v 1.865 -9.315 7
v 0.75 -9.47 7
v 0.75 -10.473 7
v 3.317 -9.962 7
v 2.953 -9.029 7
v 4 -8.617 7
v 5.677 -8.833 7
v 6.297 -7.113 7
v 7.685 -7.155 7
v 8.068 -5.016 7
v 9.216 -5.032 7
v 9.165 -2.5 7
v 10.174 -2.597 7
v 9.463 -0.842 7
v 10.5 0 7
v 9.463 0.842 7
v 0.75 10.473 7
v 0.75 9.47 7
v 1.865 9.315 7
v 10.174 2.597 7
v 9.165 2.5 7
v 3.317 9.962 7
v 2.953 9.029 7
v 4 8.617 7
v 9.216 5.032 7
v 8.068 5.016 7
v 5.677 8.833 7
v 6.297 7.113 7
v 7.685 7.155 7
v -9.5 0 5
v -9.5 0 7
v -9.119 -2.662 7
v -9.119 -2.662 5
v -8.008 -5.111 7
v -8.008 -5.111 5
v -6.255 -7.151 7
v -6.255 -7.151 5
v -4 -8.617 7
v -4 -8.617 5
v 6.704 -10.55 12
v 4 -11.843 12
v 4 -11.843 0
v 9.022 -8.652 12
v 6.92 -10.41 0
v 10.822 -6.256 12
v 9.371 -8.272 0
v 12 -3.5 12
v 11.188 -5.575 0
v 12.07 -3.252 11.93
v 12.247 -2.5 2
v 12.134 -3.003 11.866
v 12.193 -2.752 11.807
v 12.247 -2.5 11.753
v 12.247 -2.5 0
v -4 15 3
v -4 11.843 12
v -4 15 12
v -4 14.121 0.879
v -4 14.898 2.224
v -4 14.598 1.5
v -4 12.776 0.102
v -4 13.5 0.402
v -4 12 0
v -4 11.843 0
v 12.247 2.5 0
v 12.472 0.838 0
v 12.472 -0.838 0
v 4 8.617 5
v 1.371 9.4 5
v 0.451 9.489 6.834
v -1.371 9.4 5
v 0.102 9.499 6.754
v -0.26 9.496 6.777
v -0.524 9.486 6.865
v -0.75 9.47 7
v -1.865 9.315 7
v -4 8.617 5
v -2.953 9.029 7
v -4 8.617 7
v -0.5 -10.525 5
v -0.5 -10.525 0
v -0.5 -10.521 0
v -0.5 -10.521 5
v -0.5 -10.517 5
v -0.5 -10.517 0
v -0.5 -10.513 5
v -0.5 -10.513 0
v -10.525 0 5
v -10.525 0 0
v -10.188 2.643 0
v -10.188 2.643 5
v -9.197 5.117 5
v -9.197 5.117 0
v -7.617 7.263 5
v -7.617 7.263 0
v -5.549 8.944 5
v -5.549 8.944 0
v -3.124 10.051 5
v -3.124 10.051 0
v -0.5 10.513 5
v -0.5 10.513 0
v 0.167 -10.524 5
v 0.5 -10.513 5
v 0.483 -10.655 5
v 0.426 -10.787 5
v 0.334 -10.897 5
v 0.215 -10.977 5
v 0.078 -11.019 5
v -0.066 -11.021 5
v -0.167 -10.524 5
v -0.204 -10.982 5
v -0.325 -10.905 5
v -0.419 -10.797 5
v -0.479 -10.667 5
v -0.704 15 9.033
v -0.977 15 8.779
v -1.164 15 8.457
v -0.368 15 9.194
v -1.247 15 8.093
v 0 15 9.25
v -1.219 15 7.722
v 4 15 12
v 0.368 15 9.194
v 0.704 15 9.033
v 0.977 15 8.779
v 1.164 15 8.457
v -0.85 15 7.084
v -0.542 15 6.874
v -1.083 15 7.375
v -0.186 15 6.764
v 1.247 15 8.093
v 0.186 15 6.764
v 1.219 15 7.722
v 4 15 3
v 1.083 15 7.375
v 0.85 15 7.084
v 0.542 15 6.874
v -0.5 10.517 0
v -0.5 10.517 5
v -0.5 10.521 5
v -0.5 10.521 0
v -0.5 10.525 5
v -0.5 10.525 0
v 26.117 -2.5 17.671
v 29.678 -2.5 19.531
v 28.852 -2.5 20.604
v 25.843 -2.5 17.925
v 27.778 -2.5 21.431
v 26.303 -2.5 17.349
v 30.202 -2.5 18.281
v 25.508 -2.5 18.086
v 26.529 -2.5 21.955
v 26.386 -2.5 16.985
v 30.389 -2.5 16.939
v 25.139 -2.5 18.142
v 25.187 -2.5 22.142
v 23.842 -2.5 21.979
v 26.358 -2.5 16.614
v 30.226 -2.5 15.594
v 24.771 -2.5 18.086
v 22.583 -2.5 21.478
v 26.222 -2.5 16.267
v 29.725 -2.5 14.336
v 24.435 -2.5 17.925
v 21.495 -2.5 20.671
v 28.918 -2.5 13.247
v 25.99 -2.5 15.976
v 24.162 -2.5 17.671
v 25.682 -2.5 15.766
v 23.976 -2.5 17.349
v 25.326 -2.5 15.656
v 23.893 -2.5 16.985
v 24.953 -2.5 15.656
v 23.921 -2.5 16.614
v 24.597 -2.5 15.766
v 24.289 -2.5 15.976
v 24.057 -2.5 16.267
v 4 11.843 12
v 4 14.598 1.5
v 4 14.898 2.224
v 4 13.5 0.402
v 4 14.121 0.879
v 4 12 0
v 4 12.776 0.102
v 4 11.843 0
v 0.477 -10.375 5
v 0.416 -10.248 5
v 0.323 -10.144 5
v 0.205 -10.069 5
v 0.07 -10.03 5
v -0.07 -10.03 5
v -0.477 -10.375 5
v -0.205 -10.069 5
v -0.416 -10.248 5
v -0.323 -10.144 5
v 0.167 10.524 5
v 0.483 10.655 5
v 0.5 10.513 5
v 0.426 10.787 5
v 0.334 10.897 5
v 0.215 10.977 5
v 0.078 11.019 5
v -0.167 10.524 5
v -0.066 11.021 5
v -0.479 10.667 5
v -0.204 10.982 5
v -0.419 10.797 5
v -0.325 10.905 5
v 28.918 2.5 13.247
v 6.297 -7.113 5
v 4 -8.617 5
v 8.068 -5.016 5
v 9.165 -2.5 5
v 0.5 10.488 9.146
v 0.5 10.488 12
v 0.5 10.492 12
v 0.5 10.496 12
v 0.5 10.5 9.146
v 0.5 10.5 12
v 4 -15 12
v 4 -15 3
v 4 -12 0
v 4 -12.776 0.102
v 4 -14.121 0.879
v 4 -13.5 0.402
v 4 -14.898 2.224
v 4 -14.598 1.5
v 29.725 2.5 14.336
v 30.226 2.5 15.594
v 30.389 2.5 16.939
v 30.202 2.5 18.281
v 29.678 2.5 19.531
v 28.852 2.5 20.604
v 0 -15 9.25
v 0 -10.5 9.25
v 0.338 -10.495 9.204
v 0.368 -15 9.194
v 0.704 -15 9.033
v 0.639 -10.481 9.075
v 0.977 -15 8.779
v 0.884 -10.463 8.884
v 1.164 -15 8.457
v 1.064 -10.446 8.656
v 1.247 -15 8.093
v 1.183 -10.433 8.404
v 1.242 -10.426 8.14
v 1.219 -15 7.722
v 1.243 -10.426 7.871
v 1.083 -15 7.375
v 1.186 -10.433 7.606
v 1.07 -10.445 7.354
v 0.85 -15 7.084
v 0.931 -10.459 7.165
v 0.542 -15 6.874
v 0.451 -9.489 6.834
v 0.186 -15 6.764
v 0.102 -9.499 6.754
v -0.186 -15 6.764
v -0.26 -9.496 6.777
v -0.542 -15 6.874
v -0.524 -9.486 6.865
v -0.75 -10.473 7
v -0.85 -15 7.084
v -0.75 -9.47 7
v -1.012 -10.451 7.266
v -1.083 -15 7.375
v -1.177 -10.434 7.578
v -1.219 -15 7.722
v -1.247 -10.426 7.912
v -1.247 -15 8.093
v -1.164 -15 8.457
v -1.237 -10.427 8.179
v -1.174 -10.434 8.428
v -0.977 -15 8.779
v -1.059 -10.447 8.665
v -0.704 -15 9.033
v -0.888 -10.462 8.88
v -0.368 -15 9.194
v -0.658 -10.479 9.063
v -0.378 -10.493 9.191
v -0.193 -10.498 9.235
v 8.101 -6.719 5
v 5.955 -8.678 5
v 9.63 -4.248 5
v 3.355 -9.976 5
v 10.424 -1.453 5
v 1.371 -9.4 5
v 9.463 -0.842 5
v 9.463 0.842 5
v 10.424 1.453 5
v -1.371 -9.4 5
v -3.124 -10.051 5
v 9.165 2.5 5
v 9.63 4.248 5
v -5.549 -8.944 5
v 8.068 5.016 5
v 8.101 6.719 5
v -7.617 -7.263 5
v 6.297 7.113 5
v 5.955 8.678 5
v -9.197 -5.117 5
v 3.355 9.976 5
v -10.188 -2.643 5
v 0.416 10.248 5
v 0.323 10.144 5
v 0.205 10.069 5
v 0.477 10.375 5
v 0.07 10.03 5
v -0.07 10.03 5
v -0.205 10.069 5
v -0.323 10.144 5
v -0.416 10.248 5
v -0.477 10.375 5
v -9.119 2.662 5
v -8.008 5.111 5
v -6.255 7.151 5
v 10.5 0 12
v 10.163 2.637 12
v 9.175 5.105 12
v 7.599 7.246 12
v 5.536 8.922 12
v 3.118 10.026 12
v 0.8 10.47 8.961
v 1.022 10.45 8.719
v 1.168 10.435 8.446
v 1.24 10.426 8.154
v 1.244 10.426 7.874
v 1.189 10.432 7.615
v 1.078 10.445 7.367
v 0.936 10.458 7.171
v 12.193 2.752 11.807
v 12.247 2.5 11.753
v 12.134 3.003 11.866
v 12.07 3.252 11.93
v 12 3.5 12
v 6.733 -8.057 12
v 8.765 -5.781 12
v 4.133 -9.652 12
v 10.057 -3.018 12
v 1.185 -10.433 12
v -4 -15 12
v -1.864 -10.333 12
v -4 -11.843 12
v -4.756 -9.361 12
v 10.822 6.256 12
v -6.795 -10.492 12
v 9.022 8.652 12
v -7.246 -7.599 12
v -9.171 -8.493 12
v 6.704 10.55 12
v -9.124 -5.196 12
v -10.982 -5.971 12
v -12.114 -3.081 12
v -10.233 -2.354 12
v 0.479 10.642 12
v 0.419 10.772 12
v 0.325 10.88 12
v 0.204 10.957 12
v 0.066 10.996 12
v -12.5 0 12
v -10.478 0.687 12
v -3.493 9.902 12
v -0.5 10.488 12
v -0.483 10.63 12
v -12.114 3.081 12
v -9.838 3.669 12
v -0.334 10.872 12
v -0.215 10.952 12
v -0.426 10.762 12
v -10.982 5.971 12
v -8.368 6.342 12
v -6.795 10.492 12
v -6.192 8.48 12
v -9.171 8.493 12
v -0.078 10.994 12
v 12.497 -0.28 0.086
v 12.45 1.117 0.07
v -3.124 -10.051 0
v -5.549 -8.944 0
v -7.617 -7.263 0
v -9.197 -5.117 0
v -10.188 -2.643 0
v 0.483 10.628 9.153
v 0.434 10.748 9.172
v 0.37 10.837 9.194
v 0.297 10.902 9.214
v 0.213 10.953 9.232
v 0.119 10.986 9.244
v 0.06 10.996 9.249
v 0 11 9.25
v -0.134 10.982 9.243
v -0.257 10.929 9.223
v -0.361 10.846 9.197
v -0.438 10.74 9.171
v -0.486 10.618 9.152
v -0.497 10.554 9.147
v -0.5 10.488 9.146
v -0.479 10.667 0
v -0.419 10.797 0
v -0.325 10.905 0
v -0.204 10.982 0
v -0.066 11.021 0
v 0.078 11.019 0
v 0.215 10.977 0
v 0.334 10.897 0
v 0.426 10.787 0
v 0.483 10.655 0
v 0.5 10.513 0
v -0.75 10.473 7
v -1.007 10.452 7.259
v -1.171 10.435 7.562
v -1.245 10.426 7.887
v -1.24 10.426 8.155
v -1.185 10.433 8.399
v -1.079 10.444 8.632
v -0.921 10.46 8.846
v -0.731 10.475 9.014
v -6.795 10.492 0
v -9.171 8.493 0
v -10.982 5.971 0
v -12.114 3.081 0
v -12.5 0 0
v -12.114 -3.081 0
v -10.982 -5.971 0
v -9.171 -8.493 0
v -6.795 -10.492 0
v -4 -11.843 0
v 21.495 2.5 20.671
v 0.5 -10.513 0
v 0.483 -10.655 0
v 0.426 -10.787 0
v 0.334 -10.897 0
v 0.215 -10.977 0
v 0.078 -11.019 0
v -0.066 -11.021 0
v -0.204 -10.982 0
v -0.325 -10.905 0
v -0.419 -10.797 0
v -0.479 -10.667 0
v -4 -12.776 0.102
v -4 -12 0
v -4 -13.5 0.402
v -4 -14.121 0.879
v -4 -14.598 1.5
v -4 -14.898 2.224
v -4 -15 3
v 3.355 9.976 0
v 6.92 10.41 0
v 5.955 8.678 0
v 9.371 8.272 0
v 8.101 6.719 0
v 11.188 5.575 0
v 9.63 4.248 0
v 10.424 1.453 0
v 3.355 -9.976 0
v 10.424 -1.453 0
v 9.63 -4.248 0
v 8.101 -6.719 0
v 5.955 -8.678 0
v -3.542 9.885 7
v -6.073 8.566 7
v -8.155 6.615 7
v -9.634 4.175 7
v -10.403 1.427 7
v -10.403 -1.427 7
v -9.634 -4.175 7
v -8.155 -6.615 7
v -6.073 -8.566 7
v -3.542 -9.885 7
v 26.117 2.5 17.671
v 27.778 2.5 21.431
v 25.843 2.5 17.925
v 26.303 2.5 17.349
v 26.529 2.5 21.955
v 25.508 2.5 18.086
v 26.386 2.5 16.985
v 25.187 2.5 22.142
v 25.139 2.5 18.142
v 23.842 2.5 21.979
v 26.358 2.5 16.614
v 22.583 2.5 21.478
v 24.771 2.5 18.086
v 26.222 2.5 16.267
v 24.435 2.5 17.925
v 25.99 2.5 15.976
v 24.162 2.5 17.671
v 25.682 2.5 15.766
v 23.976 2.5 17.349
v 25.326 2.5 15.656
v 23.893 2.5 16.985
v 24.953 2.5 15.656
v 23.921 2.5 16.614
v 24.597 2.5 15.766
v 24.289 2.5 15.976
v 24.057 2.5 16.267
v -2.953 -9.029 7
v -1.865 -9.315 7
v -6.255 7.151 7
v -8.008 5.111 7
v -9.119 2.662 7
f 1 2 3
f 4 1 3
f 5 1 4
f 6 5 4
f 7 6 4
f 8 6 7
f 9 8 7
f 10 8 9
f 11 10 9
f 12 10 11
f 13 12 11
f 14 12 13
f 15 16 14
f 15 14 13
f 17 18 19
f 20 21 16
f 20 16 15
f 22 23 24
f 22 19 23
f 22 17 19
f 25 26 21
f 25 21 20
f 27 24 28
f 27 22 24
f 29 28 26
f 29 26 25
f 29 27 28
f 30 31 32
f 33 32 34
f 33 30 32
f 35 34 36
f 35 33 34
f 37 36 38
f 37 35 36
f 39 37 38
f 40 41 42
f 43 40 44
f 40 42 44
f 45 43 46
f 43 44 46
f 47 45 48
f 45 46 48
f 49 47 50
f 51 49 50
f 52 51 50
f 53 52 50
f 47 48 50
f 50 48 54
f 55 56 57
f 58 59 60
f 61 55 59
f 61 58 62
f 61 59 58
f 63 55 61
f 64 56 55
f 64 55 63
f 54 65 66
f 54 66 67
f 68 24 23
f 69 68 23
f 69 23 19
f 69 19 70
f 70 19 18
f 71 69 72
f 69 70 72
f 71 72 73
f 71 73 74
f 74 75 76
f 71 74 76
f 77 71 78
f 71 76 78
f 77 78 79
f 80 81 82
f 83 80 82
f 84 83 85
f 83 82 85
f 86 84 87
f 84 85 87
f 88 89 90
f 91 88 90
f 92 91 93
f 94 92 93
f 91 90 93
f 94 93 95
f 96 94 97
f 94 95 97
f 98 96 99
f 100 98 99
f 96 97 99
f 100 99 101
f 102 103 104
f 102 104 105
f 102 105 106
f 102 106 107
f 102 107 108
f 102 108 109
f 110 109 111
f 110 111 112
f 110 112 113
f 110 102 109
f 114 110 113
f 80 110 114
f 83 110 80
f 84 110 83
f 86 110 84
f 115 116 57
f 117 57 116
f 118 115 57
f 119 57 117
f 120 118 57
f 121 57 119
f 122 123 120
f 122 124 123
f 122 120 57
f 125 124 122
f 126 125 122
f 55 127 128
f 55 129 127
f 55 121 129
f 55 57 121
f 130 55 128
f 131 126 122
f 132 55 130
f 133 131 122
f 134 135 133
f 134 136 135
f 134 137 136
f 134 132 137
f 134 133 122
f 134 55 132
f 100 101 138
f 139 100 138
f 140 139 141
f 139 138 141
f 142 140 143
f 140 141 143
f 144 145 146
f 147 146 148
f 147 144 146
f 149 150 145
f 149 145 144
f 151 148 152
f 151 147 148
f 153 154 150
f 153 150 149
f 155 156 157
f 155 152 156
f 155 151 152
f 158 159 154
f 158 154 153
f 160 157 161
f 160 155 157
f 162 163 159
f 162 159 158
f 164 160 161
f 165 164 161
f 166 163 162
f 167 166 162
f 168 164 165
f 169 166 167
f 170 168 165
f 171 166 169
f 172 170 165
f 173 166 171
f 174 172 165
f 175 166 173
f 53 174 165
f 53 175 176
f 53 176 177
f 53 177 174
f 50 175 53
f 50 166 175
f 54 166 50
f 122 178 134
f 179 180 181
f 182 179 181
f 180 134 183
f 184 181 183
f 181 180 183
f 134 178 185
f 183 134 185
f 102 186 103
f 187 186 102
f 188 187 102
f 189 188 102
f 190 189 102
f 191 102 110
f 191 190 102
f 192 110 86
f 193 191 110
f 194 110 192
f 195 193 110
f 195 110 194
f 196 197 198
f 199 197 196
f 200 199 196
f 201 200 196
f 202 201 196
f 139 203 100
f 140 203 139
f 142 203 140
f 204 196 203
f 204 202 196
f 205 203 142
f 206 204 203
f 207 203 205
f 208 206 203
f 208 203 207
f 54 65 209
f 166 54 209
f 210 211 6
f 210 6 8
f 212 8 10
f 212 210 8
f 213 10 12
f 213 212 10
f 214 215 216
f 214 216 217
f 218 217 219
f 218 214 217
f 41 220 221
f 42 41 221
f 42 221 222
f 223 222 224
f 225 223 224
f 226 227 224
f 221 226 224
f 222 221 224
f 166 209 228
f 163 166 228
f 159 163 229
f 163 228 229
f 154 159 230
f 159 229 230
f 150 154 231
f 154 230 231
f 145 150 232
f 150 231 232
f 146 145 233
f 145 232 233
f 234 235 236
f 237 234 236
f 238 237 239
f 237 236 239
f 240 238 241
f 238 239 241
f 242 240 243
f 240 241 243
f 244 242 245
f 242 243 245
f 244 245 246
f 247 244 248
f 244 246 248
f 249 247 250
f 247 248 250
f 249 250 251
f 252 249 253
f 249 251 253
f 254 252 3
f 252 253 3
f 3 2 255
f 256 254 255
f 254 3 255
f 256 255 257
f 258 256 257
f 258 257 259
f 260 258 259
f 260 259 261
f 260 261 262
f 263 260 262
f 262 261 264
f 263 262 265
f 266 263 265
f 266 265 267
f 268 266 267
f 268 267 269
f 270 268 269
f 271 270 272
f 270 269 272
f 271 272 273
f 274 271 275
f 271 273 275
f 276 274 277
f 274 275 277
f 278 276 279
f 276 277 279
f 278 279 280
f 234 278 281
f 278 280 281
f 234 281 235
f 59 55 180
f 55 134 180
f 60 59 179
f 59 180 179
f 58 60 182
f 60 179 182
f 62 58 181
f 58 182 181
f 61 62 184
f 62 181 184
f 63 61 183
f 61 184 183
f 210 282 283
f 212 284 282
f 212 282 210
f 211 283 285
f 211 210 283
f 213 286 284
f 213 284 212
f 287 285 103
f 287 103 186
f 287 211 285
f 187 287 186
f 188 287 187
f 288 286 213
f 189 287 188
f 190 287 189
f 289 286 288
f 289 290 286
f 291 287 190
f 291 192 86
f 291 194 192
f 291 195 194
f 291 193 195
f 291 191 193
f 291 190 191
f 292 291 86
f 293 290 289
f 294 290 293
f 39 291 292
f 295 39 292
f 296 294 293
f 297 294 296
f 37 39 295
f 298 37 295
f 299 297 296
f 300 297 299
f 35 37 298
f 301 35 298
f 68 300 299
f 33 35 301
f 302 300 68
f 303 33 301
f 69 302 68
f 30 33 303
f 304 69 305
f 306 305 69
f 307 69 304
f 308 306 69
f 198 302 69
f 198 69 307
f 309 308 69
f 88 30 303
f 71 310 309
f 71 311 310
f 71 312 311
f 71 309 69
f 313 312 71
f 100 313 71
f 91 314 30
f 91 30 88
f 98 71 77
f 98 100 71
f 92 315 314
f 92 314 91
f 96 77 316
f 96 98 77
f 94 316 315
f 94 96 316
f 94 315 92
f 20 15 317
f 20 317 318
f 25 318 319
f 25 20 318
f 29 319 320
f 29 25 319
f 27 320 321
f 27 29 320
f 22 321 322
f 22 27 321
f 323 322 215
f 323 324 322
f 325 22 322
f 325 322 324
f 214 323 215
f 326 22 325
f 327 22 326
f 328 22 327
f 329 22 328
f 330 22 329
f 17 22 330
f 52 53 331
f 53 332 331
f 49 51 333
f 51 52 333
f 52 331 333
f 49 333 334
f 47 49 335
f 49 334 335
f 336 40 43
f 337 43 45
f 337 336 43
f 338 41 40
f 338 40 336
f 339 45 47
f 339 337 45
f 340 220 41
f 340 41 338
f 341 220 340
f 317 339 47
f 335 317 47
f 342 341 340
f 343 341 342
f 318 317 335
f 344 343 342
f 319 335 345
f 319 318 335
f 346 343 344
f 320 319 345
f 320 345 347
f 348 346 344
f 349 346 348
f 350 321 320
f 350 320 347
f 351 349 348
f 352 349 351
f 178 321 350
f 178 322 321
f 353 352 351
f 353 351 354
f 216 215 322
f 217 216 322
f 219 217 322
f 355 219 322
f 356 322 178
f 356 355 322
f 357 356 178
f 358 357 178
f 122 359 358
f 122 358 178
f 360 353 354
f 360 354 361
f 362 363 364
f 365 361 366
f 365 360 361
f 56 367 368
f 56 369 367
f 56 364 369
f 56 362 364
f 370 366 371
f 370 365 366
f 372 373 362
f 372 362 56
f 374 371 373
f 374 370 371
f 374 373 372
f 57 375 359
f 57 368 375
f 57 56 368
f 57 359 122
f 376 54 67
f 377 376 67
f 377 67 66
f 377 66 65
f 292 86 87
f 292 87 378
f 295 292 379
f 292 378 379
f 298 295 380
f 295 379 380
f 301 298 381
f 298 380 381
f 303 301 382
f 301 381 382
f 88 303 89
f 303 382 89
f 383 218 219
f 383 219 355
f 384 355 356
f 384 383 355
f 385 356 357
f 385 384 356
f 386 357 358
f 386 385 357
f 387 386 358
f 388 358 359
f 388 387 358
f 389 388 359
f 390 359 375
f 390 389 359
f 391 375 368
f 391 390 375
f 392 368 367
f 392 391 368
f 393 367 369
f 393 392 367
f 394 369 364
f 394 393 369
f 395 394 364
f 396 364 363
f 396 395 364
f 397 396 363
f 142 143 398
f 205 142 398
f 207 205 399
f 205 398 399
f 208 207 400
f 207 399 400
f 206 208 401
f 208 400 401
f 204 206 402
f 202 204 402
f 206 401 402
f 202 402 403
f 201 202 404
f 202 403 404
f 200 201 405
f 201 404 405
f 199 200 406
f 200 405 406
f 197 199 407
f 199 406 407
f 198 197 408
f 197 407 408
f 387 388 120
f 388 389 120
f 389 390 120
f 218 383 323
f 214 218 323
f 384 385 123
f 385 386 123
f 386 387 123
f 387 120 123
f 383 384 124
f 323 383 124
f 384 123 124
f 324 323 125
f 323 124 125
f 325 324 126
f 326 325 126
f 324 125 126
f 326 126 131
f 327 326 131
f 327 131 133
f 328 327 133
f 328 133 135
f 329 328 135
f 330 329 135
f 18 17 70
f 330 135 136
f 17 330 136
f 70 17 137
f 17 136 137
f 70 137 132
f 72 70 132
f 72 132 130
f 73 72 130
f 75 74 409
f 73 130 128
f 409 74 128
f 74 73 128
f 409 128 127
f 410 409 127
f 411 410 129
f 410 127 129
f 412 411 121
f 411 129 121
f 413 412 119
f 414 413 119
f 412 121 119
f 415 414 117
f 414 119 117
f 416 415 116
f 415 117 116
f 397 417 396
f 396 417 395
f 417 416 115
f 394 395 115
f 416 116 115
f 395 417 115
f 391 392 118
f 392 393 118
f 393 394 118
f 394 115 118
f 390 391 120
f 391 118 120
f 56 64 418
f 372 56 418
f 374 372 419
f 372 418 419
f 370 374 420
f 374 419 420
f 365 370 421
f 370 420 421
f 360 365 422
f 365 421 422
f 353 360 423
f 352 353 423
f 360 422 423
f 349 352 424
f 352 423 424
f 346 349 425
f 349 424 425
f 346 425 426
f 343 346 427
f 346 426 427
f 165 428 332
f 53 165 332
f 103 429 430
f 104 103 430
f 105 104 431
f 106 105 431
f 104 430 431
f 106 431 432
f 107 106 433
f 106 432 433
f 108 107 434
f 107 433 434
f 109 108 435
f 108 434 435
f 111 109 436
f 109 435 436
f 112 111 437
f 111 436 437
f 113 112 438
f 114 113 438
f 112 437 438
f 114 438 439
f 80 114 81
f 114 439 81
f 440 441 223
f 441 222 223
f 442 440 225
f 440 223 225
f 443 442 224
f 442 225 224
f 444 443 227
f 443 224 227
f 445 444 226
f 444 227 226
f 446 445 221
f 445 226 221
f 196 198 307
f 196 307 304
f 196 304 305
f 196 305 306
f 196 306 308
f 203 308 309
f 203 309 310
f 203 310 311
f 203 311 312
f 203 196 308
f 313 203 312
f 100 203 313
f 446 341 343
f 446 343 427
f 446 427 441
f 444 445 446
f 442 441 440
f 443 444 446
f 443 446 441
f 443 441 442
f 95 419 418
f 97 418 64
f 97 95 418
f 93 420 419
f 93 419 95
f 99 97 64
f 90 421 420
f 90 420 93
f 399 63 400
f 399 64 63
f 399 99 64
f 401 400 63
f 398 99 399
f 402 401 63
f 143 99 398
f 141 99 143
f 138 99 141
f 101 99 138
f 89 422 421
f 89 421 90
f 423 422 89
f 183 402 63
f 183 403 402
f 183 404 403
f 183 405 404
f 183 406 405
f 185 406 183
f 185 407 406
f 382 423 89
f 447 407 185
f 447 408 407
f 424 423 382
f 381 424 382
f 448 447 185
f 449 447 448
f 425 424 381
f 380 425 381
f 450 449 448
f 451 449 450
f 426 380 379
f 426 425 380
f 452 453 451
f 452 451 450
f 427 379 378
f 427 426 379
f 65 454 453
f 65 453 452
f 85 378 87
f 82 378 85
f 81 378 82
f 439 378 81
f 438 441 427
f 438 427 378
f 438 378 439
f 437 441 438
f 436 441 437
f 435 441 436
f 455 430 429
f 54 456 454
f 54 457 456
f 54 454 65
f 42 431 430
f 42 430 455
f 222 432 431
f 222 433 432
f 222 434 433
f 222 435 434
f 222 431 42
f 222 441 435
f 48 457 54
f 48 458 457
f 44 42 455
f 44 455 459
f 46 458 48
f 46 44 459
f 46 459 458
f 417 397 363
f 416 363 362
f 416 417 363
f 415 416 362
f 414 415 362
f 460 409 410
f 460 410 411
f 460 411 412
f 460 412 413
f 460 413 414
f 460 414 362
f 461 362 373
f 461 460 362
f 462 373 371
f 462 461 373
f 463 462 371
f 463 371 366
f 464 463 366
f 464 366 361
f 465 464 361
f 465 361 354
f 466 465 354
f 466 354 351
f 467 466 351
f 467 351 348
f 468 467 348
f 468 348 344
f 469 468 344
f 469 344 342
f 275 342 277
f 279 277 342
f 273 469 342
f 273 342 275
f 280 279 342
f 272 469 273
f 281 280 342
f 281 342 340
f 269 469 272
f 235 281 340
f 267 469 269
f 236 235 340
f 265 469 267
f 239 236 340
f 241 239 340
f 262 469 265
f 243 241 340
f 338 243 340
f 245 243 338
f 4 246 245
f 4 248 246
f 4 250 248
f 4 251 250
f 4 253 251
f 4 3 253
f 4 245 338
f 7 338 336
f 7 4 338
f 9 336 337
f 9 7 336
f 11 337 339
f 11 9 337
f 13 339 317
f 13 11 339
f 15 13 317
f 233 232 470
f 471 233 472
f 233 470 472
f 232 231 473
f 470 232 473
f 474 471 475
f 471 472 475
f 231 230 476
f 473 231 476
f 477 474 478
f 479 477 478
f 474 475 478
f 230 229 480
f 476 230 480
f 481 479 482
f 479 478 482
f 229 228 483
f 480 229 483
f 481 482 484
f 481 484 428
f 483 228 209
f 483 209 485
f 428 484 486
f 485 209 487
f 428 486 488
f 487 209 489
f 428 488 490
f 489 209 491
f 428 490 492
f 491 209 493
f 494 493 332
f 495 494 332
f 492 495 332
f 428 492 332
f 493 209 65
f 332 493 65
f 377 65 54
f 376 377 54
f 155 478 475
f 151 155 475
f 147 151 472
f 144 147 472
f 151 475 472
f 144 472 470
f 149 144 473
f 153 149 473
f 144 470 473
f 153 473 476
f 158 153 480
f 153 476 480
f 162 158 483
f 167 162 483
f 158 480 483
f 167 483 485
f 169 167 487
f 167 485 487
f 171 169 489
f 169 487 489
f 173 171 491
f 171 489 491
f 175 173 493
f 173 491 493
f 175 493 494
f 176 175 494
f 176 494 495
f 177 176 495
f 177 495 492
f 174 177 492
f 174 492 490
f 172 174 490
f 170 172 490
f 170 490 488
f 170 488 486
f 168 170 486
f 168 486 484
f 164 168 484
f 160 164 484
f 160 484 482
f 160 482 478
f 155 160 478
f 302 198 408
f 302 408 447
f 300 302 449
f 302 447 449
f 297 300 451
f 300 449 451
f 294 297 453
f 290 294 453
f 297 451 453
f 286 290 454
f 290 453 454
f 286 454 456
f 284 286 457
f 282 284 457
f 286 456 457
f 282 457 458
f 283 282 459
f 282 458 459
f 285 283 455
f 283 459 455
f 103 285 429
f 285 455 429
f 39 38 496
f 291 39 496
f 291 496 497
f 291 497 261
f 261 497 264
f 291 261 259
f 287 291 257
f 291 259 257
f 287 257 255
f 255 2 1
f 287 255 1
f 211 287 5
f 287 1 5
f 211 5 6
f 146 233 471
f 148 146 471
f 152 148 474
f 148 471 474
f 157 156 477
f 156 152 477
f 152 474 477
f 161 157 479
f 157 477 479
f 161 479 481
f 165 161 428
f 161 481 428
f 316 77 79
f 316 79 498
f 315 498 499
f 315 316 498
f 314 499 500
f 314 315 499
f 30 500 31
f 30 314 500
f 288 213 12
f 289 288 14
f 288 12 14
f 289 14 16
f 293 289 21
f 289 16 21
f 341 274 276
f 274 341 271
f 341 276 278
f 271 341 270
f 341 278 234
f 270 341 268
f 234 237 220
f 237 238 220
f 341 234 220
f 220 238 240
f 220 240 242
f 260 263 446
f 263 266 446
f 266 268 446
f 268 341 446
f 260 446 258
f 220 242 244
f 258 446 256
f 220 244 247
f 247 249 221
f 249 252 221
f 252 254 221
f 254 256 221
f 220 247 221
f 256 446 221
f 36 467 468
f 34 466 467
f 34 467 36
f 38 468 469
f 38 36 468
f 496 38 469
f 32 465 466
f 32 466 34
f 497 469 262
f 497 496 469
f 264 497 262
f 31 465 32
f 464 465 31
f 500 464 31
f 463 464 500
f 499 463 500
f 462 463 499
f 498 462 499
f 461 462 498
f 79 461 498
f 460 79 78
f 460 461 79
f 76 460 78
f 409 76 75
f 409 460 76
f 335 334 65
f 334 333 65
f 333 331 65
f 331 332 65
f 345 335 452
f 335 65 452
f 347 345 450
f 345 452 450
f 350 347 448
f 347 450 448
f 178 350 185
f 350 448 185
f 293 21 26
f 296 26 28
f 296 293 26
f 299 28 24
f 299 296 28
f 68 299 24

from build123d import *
from build123d.topology import SkipClean

# Parameters (mm, degrees)
SKETCH1_R                = 12.5
SKETCH1_R_2              = 9.5
BOSS_EXTRUDE1_DEPTH      = 7
SKETCH2_R                = 12.5
SKETCH2_R_2              = 9.5
BOSS_EXTRUDE2_DEPTH      = 5
BOSS_EXTRUDE3_DEPTH      = 15
BOSS_EXTRUDE3_DEPTH_BACK = 15
SKETCH3_W                = 8
SKETCH3_H                = 12
FILLET1_R                = 3
SKETCH6_R                = 1.25
CUT_EXTRUDE3_DEPTH       = 35.644624403
SKETCH7_W                = 10
SKETCH7_H                = 5
BOSS_EXTRUDE4_DEPTH      = 16
CHAMFER1_SIZE            = 8
SKETCH8_W                = 10.963763172
SKETCH8_H                = 5
BOSS_EXTRUDE5_DEPTH      = 18
SKETCH9_R                = 1.25
CUT_EXTRUDE4_DEPTH       = 45.459649771
BOSS_EXTRUDE7_DEPTH      = 5
SKETCH12_R               = 10.525
CUT_EXTRUDE7_DEPTH       = 5
SKETCH4_R                = 9.5
CUT_EXTRUDE8_DEPTH       = 36.951519181
SKETCH14_R               = 0.5
CUT_EXTRUDE9_DEPTH       = 5
CUT_EXTRUDE10_DEPTH      = 5
CUT_EXTRUDE12_DEPTH      = 5


with BuildPart() as part:
    # Sketch1 → Boss-Extrude1 (new body)
    with BuildSketch(Plane.XY):
        Circle(SKETCH1_R)
        Circle(SKETCH1_R_2, mode=Mode.SUBTRACT)
    extrude(amount=BOSS_EXTRUDE1_DEPTH)

    # Sketch2 → Boss-Extrude2 (add)
    with BuildSketch(Plane.XY.offset(7)):
        Circle(SKETCH2_R)
        Circle(SKETCH2_R_2, mode=Mode.SUBTRACT)
    extrude(amount=BOSS_EXTRUDE2_DEPTH)

    # Sketch3 → Boss-Extrude3 (add, two sides: drawn at the far end of the back side and taken through both)
    with BuildSketch(Plane(origin=(0, 0, 0), x_dir=(1, 0, 0), z_dir=(0, 1, 0)).offset(-BOSS_EXTRUDE3_DEPTH_BACK)):
        with Locations((0, -6)):
            Rectangle(SKETCH3_W, SKETCH3_H)
    extrude(amount=BOSS_EXTRUDE3_DEPTH + BOSS_EXTRUDE3_DEPTH_BACK)

    # Fillet1
    fillet1_edges = [part.edges().sort_by_distance(p)[0] for p in [
        (0, -15, 0),
        (0, 15, 0),
    ]]
    fillet(fillet1_edges, radius=FILLET1_R)

    # Sketch6 → Cut-Extrude3 (cut, through all)
    with BuildSketch(Plane(origin=(0, 15, 0), x_dir=(1, 0, 0), z_dir=(0, 1, 0))):
        with Locations((0, -8)):
            Circle(SKETCH6_R)
    extrude(amount=-CUT_EXTRUDE3_DEPTH, mode=Mode.SUBTRACT)

    # Sketch7 → Boss-Extrude4 (add)
    with BuildSketch(Plane(origin=(4, 0, 0), x_dir=(0, 0, -1), z_dir=(1, 0, 0))):
        with Locations((-7, 0)):
            Rectangle(SKETCH7_W, SKETCH7_H)
    extrude(amount=BOSS_EXTRUDE4_DEPTH)

    # Chamfer1
    chamfer1_edges = [part.edges().sort_by_distance(p)[0] for p in [
        (20, 0, 12),
    ]]
    chamfer(chamfer1_edges, length=CHAMFER1_SIZE)

    # Sketch8 → Boss-Extrude5 (add)
    with BuildSketch(Plane(origin=(12, 0, 12), x_dir=(0.7071067811865487, 0, -0.7071067811865465), z_dir=(0.7071067811865465, 0, 0.7071067811865487))):
        with Locations((5.831826913, 0)):
            Rectangle(SKETCH8_W, SKETCH8_H)
    extrude(amount=BOSS_EXTRUDE5_DEPTH)

    # Sketch9 → Cut-Extrude4 (cut, through all)
    with BuildSketch(Plane(origin=(0, 2.5, 0), x_dir=(1, 0, 0), z_dir=(0, 1, 0))):
        Polygon((18.071186966, -2), (20, -4), (20, -2), align=None)
        with BuildLine():
            Line((20, -4), (28.918290257, -13.247438813))
            ThreePointArc((28.918290257, -13.247438813), (30.389120415, -16.93944416), (28.851646418, -20.604197704))
            Line((28.851646418, -20.604197704), (32.727922061, -16.727922061))
            Line((32.727922061, -16.727922061), (20, -4))
        make_face()
        with BuildLine():
            ThreePointArc((28.851646418, -20.604197704), (25.186892874, -22.141671701), (21.494887527, -20.670841544))
            Line((21.494887527, -20.670841544), (12.247448714, -11.752551286))
            Line((12.247448714, -11.752551286), (24.975370775, -24.480473347))
            Line((24.975370775, -24.480473347), (28.851646418, -20.604197704))
        make_face()
        with Locations((25.139335817, -16.891887103)):
            Circle(SKETCH9_R)
    extrude(amount=-CUT_EXTRUDE4_DEPTH, mode=Mode.SUBTRACT)

    # Sketch10 → Boss-Extrude7 (add)
    with BuildSketch(Plane(origin=(0, 2.5, 0), x_dir=(1, 0, 0), z_dir=(0, 1, 0))):
        Polygon((12.247448714, -2), (12.247448714, 0), (18.071186966, -2), align=None)
    extrude(amount=-BOSS_EXTRUDE7_DEPTH)

    # Sketch12 → Cut-Extrude7 (cut)
    with BuildSketch(Plane(origin=(0, 0, 0), x_dir=(-1, 0, 0), z_dir=(0, 0, -1))):
        Circle(SKETCH12_R)
    extrude(amount=-CUT_EXTRUDE7_DEPTH, mode=Mode.SUBTRACT)

    # Sketch4 → Cut-Extrude8 (cut, through all)
    with SkipClean():  # the faces are left unmerged after this step: merging them gives an invalid solid
        with BuildSketch(Plane.XY.offset(12)):
            Circle(SKETCH4_R)
        extrude(amount=-CUT_EXTRUDE8_DEPTH, mode=Mode.SUBTRACT)

    # Sketch14 → Cut-Extrude9 (cut)
    with SkipClean():  # the faces are left unmerged after this step: merging them gives an invalid solid
        with BuildSketch(Plane(origin=(0, 0, 0), x_dir=(-1, 0, 0), z_dir=(0, 0, -1))):
            with Locations((0, 10.525)):
                Circle(SKETCH14_R)
            with Locations((0, -10.525)):
                Circle(SKETCH14_R)
        extrude(amount=-CUT_EXTRUDE9_DEPTH, mode=Mode.SUBTRACT)

    # Sketch15 → Cut-Extrude10 (cut)
    with SkipClean():  # the faces are left unmerged after this step: merging them gives an invalid solid
        with BuildSketch(Plane.XY.offset(12)):
            with BuildLine():
                ThreePointArc((-0.499858257, 10.488095238), (0, -10.5), (0.499858257, 10.488095238))
                ThreePointArc((0.499858257, 10.488095238), (0, 11), (-0.499858257, 10.488095238))
            make_face()
        extrude(amount=-CUT_EXTRUDE10_DEPTH, mode=Mode.SUBTRACT)

    # Sketch16 → Cut-Extrude12 (cut)
    with SkipClean():  # the faces are left unmerged after this step: merging them gives an invalid solid
        with BuildSketch(Plane(origin=(0, 2.5, 0), x_dir=(1, 0, 0), z_dir=(0, 1, 0))):
            Polygon((12.247448714, 0), (28.918290257, -13.247438813), (18.071186966, -2), align=None)
        extrude(amount=-CUT_EXTRUDE12_DEPTH, mode=Mode.SUBTRACT)


solid = part.part
